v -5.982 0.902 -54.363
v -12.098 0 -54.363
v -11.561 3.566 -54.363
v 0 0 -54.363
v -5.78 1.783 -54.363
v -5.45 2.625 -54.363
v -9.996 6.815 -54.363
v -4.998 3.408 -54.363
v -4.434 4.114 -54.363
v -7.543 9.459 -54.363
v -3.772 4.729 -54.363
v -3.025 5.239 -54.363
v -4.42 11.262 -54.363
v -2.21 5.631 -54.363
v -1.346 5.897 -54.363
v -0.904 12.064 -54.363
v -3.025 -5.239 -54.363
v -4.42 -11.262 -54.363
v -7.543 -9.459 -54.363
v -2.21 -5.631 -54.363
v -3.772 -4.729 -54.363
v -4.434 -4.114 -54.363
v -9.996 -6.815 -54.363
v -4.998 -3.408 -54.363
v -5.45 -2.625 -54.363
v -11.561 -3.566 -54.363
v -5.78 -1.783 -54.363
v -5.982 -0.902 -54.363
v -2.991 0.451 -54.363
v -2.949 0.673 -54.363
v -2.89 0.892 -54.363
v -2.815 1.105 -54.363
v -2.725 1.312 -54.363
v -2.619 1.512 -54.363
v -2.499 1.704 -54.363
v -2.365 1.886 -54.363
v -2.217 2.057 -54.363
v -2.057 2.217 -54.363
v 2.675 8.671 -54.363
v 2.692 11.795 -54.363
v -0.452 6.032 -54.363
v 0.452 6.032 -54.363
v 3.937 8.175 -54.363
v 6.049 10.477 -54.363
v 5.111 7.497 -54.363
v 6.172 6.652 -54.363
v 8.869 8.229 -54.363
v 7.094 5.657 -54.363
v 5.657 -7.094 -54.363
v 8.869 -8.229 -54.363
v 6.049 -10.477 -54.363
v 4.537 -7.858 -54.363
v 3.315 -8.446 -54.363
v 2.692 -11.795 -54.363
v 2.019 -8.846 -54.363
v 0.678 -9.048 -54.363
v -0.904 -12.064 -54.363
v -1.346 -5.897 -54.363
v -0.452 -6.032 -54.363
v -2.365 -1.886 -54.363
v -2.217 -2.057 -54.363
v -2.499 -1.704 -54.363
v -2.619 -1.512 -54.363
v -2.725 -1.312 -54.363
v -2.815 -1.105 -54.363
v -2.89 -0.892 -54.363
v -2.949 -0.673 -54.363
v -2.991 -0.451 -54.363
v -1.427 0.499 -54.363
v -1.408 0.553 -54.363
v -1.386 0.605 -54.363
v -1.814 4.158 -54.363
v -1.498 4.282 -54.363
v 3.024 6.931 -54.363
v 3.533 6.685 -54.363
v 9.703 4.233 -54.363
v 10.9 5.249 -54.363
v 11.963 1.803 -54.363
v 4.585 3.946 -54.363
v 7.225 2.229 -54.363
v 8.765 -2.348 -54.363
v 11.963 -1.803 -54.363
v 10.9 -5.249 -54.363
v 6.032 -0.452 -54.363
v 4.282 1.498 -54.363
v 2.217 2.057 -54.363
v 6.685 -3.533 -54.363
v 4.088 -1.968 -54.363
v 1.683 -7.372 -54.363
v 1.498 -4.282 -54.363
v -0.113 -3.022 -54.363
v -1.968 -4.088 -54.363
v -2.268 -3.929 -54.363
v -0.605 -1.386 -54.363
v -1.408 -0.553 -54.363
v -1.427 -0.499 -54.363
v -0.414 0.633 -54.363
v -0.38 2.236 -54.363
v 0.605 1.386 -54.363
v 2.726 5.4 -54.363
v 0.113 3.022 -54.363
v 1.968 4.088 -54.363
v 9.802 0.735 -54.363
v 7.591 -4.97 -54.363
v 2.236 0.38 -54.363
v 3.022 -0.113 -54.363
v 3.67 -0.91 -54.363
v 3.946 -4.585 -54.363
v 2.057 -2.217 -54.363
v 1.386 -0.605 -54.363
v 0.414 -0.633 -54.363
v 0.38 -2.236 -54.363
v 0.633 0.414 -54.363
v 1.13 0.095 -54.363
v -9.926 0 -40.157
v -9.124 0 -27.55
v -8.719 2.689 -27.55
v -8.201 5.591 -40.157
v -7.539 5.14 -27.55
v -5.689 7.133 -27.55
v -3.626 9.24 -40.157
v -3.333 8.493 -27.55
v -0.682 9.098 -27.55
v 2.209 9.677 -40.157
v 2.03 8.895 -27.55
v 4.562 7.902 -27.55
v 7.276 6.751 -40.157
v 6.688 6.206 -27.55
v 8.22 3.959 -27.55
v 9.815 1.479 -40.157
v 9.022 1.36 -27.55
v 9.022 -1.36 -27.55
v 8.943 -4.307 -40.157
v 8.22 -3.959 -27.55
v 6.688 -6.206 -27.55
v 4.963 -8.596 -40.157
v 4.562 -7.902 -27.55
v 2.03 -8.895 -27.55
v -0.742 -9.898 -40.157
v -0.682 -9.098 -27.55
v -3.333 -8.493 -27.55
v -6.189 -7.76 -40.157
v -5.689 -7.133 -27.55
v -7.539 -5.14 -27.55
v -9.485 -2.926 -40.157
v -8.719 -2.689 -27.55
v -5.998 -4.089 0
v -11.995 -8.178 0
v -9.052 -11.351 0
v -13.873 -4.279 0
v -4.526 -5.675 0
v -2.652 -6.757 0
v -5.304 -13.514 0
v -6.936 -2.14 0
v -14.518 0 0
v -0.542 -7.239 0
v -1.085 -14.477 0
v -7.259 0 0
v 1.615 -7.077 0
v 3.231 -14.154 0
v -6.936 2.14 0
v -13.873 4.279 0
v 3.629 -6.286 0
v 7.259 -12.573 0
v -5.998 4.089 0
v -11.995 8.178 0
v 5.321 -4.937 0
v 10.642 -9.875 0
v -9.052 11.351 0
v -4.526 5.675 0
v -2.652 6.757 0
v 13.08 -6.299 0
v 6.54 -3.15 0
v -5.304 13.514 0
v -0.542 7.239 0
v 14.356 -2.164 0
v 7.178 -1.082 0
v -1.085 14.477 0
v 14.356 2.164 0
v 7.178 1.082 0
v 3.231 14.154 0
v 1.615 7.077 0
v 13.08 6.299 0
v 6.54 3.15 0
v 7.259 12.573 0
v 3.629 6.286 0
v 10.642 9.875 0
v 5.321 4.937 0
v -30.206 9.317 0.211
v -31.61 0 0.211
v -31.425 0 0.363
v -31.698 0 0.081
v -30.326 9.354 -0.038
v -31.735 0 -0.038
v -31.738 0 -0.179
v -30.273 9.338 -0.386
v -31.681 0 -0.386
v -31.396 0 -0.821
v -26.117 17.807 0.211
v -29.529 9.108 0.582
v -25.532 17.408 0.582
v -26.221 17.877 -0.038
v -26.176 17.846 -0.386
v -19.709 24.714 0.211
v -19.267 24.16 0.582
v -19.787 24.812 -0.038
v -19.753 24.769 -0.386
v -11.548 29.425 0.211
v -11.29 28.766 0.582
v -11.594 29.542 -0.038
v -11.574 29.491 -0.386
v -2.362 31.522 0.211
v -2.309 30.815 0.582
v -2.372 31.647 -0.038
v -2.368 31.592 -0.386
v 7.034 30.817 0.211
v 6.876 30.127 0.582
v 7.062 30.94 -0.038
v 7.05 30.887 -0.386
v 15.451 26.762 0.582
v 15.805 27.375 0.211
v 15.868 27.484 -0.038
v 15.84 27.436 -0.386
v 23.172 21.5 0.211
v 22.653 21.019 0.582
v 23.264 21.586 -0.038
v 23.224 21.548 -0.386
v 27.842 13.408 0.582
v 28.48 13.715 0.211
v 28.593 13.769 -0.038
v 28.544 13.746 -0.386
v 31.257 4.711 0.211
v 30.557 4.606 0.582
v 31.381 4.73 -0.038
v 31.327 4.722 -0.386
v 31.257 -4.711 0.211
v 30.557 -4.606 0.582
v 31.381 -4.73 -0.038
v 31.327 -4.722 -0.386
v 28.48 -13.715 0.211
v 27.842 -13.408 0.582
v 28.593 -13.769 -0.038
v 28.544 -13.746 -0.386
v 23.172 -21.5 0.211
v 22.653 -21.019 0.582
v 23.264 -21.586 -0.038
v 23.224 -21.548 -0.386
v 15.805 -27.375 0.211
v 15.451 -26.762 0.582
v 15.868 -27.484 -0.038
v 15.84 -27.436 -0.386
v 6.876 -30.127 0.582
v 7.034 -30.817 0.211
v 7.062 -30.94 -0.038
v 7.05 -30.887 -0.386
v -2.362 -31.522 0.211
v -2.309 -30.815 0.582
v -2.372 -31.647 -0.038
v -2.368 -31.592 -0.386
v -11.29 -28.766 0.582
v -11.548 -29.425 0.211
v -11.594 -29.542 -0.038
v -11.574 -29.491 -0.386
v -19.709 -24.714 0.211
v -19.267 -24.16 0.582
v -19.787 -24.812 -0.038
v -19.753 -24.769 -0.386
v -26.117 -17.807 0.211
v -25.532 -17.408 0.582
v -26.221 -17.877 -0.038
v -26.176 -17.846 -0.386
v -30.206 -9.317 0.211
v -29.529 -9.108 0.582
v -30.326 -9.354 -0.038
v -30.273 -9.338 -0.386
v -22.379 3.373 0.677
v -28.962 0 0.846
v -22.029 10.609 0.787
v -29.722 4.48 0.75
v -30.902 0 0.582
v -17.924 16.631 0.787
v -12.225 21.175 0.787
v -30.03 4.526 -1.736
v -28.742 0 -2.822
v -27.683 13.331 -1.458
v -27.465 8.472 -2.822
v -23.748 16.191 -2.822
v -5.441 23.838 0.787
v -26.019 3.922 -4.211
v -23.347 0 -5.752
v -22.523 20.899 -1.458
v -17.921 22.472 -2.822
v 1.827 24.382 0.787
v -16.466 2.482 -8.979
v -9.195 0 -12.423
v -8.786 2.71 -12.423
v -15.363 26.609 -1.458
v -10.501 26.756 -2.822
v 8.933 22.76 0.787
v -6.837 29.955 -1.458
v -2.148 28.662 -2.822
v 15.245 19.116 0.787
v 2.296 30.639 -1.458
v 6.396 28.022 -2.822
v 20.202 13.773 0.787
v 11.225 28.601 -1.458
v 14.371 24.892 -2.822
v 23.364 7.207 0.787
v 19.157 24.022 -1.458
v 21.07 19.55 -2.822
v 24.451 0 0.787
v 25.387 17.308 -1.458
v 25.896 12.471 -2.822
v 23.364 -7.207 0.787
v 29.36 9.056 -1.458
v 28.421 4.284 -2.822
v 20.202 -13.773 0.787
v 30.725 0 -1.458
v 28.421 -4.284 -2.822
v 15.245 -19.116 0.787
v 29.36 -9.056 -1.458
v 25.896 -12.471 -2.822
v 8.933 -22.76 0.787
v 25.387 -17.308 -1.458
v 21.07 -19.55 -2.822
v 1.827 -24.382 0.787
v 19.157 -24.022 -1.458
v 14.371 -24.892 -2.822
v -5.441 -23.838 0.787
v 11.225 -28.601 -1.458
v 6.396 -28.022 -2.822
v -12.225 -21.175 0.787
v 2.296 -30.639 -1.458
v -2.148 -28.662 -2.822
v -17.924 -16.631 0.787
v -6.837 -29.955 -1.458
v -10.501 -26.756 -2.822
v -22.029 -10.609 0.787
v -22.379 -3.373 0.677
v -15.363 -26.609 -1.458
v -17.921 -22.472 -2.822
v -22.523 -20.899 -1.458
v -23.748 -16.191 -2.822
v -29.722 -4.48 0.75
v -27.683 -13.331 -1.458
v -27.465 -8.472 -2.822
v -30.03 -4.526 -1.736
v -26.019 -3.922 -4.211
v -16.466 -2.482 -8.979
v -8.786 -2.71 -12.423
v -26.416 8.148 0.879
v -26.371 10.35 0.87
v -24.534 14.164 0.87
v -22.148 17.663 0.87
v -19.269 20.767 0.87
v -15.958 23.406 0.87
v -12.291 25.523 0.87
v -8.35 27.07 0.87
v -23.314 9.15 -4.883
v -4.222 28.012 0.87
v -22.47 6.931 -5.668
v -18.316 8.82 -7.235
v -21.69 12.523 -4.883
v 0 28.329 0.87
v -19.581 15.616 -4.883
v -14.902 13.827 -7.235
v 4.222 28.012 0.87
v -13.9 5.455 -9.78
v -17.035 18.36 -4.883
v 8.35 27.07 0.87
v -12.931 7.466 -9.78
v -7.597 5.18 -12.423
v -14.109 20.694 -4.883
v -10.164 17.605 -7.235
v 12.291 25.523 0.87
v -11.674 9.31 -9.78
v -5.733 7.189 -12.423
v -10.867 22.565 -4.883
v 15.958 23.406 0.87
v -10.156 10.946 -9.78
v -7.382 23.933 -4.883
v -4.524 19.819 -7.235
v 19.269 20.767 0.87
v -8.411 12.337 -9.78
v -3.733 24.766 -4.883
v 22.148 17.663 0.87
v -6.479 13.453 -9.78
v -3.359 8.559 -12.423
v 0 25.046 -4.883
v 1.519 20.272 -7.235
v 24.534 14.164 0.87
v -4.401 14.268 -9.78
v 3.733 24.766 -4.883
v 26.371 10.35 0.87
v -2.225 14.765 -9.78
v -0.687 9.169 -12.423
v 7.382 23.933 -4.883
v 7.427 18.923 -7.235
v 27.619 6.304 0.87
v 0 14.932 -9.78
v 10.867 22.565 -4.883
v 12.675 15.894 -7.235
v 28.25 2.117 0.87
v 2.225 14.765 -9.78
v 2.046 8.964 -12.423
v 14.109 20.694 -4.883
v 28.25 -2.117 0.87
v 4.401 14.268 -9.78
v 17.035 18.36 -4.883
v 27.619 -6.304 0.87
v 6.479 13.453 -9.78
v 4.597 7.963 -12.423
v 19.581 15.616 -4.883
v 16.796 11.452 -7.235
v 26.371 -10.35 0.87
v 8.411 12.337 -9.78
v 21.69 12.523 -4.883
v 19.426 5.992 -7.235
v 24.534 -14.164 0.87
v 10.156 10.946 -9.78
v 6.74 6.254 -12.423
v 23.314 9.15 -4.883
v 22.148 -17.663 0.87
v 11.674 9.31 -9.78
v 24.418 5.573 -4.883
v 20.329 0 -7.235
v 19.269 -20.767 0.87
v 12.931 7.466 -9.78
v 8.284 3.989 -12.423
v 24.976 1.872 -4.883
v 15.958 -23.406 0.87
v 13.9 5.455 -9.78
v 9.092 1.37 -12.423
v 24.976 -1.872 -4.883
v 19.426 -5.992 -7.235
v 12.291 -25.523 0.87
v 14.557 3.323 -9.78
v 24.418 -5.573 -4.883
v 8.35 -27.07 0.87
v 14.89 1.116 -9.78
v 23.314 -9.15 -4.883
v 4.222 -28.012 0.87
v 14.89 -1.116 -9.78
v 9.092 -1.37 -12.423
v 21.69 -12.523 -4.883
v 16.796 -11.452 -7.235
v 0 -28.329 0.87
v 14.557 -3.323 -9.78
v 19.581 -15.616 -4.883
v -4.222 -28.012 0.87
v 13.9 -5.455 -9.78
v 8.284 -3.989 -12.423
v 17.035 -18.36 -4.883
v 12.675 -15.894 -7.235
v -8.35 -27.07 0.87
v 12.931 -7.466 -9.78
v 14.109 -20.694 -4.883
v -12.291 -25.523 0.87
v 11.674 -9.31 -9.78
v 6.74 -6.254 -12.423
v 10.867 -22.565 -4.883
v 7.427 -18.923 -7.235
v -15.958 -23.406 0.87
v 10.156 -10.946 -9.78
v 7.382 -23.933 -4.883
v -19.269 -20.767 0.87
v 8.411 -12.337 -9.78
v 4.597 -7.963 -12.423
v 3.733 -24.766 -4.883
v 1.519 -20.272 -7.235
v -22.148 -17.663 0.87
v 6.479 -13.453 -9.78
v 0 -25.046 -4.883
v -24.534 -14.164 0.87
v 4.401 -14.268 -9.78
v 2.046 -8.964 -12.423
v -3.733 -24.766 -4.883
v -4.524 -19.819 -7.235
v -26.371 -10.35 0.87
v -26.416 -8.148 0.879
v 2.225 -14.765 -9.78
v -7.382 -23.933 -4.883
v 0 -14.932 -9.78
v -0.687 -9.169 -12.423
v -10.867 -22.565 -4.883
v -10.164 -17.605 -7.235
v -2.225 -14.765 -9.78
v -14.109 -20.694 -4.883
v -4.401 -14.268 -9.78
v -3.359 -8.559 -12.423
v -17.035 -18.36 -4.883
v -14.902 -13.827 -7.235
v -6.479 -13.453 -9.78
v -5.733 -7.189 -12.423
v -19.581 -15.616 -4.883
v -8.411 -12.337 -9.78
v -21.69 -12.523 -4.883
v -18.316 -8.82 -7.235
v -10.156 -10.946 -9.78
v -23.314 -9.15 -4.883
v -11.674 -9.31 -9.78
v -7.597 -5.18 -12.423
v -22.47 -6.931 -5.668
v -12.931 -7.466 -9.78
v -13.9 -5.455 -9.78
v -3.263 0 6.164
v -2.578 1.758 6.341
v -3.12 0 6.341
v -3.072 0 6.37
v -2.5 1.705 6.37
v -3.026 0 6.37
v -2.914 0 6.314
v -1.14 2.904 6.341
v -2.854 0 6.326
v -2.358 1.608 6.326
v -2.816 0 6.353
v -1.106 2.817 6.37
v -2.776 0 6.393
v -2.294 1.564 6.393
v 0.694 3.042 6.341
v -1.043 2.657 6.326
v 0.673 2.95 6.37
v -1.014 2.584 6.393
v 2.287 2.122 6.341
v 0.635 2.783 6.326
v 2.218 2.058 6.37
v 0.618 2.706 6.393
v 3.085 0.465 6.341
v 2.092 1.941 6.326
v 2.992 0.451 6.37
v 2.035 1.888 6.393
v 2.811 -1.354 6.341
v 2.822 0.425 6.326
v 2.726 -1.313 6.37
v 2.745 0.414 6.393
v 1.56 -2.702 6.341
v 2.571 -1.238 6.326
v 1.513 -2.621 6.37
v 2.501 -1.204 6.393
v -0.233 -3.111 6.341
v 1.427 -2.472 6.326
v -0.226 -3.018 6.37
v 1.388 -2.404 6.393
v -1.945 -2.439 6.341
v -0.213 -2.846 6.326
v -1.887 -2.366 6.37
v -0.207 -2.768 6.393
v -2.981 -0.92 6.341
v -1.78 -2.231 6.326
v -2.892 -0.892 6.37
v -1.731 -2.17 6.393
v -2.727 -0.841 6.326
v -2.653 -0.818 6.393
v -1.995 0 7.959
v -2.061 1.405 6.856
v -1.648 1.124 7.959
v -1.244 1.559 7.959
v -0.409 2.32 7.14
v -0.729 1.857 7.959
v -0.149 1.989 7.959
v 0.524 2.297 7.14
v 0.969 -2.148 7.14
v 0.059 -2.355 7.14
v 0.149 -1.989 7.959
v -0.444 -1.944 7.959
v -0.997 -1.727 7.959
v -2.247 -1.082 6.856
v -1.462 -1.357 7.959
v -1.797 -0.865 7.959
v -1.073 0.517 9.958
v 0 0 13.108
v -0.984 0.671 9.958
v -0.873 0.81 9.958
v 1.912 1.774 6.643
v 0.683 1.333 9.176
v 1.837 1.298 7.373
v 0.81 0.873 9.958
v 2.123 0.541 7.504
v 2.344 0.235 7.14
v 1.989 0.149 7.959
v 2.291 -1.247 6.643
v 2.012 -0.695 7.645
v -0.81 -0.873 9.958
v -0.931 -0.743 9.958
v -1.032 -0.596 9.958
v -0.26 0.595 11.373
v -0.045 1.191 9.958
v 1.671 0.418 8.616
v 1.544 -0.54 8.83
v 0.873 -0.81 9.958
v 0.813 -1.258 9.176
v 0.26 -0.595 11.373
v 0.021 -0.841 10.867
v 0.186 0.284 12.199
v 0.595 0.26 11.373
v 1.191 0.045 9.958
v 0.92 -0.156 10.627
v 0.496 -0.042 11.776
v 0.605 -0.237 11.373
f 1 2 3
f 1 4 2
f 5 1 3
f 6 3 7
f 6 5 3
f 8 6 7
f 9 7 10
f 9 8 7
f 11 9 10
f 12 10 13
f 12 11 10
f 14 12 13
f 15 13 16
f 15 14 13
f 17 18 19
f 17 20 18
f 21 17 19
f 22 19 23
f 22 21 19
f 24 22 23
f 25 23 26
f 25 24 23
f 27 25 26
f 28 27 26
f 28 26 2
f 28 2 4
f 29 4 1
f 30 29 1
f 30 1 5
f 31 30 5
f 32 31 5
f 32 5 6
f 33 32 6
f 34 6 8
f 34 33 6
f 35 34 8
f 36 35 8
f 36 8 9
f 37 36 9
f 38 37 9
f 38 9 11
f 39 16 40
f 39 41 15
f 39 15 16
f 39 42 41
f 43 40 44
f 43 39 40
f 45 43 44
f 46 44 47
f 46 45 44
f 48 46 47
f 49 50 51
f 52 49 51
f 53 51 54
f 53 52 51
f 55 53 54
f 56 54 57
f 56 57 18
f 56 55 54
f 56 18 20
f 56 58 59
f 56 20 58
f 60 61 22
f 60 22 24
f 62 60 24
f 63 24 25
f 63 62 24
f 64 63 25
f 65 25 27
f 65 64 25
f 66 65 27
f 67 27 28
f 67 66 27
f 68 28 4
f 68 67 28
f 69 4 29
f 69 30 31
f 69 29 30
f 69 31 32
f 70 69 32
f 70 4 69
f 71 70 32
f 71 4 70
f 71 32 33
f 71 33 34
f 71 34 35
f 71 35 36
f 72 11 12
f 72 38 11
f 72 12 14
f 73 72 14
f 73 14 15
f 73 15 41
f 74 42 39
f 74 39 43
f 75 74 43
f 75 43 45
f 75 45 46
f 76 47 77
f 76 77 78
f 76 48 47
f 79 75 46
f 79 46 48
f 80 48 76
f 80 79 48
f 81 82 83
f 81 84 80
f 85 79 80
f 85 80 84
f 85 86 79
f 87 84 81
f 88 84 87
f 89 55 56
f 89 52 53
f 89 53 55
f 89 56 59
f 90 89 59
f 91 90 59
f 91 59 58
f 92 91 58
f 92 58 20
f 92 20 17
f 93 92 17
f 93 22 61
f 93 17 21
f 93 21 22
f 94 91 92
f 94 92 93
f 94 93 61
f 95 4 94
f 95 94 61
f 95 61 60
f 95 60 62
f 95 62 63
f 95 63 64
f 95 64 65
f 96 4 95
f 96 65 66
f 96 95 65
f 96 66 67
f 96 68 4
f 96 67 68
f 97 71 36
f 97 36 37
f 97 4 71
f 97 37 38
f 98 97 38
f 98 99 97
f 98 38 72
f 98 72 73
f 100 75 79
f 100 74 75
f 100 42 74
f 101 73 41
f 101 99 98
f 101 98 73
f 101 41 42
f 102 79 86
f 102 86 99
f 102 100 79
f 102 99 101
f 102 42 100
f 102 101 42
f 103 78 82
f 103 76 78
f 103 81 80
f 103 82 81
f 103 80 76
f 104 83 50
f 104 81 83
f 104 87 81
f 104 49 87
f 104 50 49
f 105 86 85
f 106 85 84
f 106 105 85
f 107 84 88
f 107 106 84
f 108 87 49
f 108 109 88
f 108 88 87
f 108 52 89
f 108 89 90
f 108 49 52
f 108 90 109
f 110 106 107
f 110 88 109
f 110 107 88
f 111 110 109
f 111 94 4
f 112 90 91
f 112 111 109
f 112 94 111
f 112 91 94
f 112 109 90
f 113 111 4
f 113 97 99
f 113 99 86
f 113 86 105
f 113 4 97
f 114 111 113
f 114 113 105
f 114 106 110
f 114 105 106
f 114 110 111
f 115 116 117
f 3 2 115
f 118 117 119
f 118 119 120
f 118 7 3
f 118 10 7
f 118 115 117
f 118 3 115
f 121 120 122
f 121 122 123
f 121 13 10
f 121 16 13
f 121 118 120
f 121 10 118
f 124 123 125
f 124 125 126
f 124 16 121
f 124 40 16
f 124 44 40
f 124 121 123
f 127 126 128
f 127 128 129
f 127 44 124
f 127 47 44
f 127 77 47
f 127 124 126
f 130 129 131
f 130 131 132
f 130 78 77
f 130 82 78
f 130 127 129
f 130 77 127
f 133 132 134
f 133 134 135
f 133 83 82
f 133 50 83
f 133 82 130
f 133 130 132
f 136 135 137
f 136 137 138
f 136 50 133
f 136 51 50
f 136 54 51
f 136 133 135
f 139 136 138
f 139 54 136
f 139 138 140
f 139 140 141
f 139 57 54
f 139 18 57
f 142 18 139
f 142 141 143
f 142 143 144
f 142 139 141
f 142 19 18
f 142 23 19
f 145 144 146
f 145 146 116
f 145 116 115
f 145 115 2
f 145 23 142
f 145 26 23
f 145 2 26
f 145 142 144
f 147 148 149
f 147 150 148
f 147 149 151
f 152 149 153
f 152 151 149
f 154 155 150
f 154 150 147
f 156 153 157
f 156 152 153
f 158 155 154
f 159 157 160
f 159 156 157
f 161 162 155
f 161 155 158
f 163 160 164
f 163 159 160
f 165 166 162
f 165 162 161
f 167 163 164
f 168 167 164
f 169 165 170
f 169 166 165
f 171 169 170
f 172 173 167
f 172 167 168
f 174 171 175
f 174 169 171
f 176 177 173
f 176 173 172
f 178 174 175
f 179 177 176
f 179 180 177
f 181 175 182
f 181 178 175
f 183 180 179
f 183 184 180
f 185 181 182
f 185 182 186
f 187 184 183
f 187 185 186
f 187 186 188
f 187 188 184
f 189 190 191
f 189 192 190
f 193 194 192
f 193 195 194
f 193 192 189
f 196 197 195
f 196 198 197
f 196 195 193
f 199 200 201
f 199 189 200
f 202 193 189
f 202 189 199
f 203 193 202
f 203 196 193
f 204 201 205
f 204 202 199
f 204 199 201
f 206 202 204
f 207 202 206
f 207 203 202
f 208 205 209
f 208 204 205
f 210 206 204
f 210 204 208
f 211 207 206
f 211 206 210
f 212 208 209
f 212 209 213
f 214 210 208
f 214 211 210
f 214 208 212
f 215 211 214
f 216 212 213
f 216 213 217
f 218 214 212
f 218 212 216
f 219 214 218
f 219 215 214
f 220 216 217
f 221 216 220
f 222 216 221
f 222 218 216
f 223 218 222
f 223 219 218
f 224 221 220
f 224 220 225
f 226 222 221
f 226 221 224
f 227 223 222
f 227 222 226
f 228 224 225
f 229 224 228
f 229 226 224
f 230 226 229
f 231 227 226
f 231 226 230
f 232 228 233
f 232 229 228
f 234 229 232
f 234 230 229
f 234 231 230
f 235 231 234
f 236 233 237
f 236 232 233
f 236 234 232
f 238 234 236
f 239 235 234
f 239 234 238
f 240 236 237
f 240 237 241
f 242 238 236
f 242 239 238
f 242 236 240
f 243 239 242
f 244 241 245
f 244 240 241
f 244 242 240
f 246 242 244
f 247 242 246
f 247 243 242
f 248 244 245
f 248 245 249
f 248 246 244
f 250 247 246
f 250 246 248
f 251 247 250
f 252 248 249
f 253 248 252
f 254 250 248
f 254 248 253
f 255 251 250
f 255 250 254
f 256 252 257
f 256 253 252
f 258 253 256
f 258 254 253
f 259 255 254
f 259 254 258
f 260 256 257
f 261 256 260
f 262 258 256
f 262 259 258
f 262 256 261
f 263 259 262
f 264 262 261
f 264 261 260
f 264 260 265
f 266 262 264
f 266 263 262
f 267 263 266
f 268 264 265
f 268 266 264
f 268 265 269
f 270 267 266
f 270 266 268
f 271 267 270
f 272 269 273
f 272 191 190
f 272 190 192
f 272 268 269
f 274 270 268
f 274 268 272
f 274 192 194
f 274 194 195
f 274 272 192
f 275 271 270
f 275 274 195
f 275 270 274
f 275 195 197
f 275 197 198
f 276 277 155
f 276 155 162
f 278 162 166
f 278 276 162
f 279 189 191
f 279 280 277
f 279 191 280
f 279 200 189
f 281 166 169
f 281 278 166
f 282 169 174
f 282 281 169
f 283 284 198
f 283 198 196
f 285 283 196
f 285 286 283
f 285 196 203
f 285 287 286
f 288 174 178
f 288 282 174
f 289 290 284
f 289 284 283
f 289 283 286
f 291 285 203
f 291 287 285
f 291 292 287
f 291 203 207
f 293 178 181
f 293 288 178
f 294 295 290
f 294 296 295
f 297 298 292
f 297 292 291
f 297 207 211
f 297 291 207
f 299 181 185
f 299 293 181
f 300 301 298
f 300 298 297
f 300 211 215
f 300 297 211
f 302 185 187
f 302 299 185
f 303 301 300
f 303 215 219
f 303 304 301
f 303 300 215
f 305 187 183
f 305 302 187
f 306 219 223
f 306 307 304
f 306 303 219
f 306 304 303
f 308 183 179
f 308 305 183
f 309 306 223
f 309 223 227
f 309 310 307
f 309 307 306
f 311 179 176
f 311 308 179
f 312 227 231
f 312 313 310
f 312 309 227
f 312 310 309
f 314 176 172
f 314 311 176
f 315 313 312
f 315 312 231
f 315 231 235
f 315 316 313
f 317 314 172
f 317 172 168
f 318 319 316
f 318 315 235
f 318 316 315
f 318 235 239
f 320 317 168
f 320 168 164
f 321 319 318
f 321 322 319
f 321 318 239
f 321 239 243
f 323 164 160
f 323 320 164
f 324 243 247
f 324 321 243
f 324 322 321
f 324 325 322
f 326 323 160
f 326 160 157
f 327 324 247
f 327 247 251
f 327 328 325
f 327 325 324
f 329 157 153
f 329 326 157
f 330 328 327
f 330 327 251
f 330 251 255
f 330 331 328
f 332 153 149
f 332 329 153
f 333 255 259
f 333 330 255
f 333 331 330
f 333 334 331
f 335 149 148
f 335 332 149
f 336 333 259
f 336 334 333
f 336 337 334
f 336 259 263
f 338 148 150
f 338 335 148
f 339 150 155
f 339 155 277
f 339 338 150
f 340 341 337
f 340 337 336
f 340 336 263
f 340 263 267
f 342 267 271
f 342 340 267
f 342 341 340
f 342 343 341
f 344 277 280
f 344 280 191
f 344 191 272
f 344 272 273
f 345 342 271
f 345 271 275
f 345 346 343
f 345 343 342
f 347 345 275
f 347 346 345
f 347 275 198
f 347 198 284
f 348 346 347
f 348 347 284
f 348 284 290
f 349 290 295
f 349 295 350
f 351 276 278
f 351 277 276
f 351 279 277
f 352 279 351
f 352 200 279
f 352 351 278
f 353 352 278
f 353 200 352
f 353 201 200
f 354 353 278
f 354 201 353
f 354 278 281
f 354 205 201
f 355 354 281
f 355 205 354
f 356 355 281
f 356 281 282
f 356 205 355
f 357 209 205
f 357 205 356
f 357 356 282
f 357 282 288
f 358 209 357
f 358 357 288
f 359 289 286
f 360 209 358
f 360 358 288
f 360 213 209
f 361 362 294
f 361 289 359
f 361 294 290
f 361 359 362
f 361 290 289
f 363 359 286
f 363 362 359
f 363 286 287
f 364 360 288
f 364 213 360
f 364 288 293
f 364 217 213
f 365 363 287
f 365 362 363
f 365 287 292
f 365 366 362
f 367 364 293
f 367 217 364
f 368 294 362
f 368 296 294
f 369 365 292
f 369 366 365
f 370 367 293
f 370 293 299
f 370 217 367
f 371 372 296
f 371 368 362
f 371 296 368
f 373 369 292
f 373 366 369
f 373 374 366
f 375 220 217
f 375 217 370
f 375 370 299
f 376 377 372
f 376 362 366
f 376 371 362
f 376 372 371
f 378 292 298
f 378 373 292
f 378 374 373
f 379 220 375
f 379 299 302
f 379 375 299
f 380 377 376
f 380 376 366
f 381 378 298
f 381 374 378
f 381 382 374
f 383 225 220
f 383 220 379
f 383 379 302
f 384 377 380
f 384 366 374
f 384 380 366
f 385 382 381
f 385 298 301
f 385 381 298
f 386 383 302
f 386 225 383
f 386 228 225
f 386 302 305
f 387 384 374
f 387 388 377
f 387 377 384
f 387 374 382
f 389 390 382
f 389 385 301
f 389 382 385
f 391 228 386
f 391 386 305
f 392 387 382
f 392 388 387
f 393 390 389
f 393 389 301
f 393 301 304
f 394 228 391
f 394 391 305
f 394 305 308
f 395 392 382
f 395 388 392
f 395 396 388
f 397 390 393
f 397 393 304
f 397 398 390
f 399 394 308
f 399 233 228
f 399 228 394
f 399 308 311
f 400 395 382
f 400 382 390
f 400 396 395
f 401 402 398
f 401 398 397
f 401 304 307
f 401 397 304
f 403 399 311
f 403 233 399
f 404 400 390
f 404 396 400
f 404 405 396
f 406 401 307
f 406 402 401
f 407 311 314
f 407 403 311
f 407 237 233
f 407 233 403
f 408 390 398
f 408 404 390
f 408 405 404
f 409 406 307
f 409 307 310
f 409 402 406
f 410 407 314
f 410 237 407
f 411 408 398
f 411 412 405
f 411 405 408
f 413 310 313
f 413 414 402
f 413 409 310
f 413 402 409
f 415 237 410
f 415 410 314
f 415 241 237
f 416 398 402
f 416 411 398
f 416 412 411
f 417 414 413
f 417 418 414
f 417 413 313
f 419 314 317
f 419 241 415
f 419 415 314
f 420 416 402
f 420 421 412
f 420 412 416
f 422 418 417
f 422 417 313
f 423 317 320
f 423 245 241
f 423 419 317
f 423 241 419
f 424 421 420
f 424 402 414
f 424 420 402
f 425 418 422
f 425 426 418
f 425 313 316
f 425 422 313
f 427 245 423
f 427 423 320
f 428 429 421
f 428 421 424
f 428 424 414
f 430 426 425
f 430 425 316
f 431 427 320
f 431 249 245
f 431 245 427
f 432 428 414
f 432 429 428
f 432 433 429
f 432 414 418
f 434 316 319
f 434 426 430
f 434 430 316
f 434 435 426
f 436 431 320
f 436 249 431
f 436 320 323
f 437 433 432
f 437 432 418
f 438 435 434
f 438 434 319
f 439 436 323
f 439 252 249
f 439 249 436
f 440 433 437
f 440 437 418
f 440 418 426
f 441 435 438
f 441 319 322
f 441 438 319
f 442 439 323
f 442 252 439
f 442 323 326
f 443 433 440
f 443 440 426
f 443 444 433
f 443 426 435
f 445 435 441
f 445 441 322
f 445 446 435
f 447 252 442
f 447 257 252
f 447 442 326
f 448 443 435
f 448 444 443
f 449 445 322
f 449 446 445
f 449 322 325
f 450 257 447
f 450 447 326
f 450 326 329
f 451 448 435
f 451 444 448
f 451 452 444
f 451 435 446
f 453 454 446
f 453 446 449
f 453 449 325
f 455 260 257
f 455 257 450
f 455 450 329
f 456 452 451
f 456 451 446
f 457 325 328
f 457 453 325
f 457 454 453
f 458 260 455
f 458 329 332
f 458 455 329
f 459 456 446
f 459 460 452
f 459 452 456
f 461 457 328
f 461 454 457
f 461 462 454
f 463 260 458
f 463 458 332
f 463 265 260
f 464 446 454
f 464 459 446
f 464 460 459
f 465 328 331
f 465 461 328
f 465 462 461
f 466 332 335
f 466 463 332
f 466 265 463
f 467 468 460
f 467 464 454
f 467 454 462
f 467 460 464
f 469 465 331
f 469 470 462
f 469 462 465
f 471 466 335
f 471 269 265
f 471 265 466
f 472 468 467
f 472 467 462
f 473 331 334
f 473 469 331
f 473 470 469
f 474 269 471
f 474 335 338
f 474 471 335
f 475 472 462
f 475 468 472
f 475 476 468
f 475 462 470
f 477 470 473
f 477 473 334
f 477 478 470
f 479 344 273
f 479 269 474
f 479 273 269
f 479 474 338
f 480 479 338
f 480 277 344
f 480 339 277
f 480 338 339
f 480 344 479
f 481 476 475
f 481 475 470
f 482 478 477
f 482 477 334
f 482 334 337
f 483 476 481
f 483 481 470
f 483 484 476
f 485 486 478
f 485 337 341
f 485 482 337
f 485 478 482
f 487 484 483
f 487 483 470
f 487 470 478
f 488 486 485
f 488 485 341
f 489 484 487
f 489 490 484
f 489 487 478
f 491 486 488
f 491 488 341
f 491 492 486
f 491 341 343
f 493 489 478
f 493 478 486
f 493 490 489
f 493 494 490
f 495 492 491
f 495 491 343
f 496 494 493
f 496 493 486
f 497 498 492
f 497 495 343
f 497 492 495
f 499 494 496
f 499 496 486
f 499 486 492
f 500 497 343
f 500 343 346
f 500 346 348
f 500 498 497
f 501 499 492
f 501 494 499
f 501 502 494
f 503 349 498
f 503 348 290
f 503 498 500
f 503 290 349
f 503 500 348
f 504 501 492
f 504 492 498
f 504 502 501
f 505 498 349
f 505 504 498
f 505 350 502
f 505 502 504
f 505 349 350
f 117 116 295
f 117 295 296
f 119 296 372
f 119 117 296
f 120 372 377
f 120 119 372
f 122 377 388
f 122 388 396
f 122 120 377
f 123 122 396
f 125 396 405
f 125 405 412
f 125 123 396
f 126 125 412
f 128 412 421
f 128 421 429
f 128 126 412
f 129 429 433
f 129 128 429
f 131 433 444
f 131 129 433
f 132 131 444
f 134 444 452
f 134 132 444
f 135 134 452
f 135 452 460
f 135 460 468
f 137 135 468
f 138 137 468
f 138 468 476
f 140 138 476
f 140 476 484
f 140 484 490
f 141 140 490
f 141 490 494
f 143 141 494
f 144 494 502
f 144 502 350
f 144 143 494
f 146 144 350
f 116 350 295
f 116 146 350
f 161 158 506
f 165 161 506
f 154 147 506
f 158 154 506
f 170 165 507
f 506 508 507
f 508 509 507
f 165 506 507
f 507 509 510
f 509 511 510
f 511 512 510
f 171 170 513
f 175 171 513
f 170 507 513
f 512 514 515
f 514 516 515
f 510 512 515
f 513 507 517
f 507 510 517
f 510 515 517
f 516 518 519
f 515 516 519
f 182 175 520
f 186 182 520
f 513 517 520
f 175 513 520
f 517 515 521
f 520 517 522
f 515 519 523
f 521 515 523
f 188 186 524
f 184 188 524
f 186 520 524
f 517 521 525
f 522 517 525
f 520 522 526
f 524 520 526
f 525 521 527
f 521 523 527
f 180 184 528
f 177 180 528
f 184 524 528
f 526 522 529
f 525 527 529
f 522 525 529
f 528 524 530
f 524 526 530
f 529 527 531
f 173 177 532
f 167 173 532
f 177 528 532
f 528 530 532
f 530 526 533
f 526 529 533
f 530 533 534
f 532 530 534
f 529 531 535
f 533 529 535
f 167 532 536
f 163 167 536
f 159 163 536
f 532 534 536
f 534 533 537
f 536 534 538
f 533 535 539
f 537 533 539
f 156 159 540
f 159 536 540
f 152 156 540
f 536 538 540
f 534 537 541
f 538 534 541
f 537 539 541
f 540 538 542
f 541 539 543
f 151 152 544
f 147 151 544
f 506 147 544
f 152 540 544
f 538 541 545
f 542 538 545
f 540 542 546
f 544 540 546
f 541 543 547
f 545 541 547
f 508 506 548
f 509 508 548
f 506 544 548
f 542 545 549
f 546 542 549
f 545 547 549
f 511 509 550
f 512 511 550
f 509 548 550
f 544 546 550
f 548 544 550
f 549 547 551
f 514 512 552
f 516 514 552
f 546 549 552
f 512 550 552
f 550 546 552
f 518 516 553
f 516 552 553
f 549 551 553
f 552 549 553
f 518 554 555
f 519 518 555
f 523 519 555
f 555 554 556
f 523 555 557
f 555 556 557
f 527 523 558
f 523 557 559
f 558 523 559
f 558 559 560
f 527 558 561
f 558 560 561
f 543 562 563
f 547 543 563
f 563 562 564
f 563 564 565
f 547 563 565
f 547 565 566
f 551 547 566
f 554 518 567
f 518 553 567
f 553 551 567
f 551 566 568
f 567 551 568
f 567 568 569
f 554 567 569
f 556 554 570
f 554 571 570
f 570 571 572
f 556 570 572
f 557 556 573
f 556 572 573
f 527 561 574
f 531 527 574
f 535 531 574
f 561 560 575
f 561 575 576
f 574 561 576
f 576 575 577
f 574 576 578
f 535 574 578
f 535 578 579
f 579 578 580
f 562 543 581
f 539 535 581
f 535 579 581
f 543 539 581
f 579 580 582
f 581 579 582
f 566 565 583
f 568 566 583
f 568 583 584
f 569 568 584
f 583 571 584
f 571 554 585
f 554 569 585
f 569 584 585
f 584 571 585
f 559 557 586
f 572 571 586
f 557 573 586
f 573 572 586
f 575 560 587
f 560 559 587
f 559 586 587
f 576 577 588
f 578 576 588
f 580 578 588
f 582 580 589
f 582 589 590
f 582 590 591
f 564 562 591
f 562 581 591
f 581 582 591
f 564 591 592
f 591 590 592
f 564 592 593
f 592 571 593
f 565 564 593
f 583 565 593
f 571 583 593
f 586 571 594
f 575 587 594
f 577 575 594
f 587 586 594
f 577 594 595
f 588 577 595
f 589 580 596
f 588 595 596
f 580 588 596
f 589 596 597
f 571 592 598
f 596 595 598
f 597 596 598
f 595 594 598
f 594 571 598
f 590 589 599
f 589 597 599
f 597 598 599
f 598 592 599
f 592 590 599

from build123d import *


with BuildPart() as f1:
    # F0 (on Front) → F1 (revolve)
    with BuildSketch(Plane.XZ):
        with BuildLine():
            Line((0, -27.5497364838), (0, 0))
            Line((0, 0), (-7.2589721531, 0))
            Line((-7.2589721531, 0), (-14.5179443061, 0))
            add(Edge.make_bspline(
                [(-14.5179443061, 0), (-9.3775563899, -2.8154343998), (-9.3198215703, -6.833216557), (-9.1946972534, -12.4227413908)],
                knots=[0, 0, 0, 0, 0.3618334222, 0.3618334222, 0.3618334222, 0.3618334222], degree=3))
            add(Edge.make_bspline(
                [(-9.1946972534, -12.4227413908), (-9.100447363, -16.6330509134), (-8.967961646, -21.735144514), (-9.1239953895, -27.5497364838)],
                knots=[0.3618334222, 0.3618334222, 0.3618334222, 0.3618334222, 0.6343844436, 0.6343844436, 0.6343844436, 0.6343844436], degree=3))
            Line((-9.1239953895, -27.5497364838), (0, -27.5497364838))
        make_face()
    revolve(axis=Axis((0, 0, -20.6276285462), (0, 0, -1)))

    # F0 (on Front) → F2 (revolve)
    with BuildSketch(Plane.XZ):
        with BuildLine():
            Line((-7.2589721531, 0), (0, 0))
            Line((0, 0), (0, 13.1082097068))
            add(Edge.make_bspline(
                [(-7.2589721531, 0), (-4.4924598292, 3.6052925076), (-2.4045022184, 8.5794495739), (-3.145750045, 4.6283610629), (0, 13.1082097068)],
                knots=[0, 0, 0, 0, 0.5024682649, 1, 1, 1, 1], degree=3))
        make_face()
    revolve(axis=Axis((0, 0, -20.6276285462), (0, 0, -1)))

    # F0 (on Front) → F3 (revolve)
    with BuildSketch(Plane.XZ):
        with BuildLine():
            add(Edge.make_bspline(
                [(-14.5179443061, 0), (-9.3775563899, -2.8154343998), (-9.3198215703, -6.833216557), (-9.1946972534, -12.4227413908)],
                knots=[0, 0, 0, 0, 0.3618334222, 0.3618334222, 0.3618334222, 0.3618334222], degree=3))
            add(Edge.make_bspline(
                [(-14.5179443061, 0), (-22.9265928726, 0.7617920093), (-41.616939242, 2.4550672606), (-20.7008130193, -7.1428539374), (-9.1946972534, -12.4227413908)],
                knots=[0, 0, 0, 0, 0.4498926023, 1, 1, 1, 1], degree=3))
        make_face()
    revolve(axis=Axis((0, 0, -20.6276285462), (0, 0, -1)))

    # F0 (on Front) → F4 (revolve)
    with BuildSketch(Plane.XZ):
        with BuildLine():
            Line((0, -54.3634667993), (0, -27.5497364838))
            Line((0, -27.5497364838), (-9.1239953895, -27.5497364838))
            add(Edge.make_bspline(
                [(-9.1239953895, -27.5497364838), (-9.3333079933, -35.3497633077), (-10.0618135818, -44.4319364176), (-12.0982872322, -54.3634667993)],
                knots=[0.6343844436, 0.6343844436, 0.6343844436, 0.6343844436, 1, 1, 1, 1], degree=3))
            add(Edge.make_bspline(
                [(-12.0982872322, -54.3634667993), (-8.0655248215, -54.3634667993), (-4.0327624107, -54.3634667993), (0, -54.3634667993)],
                knots=[0, 0, 0, 0, 12.0982872322, 12.0982872322, 12.0982872322, 12.0982872322], degree=3))
        make_face()
    revolve(axis=Axis((0, 0, -20.6276285462), (0, 0, -1)))


solid = f1.part
